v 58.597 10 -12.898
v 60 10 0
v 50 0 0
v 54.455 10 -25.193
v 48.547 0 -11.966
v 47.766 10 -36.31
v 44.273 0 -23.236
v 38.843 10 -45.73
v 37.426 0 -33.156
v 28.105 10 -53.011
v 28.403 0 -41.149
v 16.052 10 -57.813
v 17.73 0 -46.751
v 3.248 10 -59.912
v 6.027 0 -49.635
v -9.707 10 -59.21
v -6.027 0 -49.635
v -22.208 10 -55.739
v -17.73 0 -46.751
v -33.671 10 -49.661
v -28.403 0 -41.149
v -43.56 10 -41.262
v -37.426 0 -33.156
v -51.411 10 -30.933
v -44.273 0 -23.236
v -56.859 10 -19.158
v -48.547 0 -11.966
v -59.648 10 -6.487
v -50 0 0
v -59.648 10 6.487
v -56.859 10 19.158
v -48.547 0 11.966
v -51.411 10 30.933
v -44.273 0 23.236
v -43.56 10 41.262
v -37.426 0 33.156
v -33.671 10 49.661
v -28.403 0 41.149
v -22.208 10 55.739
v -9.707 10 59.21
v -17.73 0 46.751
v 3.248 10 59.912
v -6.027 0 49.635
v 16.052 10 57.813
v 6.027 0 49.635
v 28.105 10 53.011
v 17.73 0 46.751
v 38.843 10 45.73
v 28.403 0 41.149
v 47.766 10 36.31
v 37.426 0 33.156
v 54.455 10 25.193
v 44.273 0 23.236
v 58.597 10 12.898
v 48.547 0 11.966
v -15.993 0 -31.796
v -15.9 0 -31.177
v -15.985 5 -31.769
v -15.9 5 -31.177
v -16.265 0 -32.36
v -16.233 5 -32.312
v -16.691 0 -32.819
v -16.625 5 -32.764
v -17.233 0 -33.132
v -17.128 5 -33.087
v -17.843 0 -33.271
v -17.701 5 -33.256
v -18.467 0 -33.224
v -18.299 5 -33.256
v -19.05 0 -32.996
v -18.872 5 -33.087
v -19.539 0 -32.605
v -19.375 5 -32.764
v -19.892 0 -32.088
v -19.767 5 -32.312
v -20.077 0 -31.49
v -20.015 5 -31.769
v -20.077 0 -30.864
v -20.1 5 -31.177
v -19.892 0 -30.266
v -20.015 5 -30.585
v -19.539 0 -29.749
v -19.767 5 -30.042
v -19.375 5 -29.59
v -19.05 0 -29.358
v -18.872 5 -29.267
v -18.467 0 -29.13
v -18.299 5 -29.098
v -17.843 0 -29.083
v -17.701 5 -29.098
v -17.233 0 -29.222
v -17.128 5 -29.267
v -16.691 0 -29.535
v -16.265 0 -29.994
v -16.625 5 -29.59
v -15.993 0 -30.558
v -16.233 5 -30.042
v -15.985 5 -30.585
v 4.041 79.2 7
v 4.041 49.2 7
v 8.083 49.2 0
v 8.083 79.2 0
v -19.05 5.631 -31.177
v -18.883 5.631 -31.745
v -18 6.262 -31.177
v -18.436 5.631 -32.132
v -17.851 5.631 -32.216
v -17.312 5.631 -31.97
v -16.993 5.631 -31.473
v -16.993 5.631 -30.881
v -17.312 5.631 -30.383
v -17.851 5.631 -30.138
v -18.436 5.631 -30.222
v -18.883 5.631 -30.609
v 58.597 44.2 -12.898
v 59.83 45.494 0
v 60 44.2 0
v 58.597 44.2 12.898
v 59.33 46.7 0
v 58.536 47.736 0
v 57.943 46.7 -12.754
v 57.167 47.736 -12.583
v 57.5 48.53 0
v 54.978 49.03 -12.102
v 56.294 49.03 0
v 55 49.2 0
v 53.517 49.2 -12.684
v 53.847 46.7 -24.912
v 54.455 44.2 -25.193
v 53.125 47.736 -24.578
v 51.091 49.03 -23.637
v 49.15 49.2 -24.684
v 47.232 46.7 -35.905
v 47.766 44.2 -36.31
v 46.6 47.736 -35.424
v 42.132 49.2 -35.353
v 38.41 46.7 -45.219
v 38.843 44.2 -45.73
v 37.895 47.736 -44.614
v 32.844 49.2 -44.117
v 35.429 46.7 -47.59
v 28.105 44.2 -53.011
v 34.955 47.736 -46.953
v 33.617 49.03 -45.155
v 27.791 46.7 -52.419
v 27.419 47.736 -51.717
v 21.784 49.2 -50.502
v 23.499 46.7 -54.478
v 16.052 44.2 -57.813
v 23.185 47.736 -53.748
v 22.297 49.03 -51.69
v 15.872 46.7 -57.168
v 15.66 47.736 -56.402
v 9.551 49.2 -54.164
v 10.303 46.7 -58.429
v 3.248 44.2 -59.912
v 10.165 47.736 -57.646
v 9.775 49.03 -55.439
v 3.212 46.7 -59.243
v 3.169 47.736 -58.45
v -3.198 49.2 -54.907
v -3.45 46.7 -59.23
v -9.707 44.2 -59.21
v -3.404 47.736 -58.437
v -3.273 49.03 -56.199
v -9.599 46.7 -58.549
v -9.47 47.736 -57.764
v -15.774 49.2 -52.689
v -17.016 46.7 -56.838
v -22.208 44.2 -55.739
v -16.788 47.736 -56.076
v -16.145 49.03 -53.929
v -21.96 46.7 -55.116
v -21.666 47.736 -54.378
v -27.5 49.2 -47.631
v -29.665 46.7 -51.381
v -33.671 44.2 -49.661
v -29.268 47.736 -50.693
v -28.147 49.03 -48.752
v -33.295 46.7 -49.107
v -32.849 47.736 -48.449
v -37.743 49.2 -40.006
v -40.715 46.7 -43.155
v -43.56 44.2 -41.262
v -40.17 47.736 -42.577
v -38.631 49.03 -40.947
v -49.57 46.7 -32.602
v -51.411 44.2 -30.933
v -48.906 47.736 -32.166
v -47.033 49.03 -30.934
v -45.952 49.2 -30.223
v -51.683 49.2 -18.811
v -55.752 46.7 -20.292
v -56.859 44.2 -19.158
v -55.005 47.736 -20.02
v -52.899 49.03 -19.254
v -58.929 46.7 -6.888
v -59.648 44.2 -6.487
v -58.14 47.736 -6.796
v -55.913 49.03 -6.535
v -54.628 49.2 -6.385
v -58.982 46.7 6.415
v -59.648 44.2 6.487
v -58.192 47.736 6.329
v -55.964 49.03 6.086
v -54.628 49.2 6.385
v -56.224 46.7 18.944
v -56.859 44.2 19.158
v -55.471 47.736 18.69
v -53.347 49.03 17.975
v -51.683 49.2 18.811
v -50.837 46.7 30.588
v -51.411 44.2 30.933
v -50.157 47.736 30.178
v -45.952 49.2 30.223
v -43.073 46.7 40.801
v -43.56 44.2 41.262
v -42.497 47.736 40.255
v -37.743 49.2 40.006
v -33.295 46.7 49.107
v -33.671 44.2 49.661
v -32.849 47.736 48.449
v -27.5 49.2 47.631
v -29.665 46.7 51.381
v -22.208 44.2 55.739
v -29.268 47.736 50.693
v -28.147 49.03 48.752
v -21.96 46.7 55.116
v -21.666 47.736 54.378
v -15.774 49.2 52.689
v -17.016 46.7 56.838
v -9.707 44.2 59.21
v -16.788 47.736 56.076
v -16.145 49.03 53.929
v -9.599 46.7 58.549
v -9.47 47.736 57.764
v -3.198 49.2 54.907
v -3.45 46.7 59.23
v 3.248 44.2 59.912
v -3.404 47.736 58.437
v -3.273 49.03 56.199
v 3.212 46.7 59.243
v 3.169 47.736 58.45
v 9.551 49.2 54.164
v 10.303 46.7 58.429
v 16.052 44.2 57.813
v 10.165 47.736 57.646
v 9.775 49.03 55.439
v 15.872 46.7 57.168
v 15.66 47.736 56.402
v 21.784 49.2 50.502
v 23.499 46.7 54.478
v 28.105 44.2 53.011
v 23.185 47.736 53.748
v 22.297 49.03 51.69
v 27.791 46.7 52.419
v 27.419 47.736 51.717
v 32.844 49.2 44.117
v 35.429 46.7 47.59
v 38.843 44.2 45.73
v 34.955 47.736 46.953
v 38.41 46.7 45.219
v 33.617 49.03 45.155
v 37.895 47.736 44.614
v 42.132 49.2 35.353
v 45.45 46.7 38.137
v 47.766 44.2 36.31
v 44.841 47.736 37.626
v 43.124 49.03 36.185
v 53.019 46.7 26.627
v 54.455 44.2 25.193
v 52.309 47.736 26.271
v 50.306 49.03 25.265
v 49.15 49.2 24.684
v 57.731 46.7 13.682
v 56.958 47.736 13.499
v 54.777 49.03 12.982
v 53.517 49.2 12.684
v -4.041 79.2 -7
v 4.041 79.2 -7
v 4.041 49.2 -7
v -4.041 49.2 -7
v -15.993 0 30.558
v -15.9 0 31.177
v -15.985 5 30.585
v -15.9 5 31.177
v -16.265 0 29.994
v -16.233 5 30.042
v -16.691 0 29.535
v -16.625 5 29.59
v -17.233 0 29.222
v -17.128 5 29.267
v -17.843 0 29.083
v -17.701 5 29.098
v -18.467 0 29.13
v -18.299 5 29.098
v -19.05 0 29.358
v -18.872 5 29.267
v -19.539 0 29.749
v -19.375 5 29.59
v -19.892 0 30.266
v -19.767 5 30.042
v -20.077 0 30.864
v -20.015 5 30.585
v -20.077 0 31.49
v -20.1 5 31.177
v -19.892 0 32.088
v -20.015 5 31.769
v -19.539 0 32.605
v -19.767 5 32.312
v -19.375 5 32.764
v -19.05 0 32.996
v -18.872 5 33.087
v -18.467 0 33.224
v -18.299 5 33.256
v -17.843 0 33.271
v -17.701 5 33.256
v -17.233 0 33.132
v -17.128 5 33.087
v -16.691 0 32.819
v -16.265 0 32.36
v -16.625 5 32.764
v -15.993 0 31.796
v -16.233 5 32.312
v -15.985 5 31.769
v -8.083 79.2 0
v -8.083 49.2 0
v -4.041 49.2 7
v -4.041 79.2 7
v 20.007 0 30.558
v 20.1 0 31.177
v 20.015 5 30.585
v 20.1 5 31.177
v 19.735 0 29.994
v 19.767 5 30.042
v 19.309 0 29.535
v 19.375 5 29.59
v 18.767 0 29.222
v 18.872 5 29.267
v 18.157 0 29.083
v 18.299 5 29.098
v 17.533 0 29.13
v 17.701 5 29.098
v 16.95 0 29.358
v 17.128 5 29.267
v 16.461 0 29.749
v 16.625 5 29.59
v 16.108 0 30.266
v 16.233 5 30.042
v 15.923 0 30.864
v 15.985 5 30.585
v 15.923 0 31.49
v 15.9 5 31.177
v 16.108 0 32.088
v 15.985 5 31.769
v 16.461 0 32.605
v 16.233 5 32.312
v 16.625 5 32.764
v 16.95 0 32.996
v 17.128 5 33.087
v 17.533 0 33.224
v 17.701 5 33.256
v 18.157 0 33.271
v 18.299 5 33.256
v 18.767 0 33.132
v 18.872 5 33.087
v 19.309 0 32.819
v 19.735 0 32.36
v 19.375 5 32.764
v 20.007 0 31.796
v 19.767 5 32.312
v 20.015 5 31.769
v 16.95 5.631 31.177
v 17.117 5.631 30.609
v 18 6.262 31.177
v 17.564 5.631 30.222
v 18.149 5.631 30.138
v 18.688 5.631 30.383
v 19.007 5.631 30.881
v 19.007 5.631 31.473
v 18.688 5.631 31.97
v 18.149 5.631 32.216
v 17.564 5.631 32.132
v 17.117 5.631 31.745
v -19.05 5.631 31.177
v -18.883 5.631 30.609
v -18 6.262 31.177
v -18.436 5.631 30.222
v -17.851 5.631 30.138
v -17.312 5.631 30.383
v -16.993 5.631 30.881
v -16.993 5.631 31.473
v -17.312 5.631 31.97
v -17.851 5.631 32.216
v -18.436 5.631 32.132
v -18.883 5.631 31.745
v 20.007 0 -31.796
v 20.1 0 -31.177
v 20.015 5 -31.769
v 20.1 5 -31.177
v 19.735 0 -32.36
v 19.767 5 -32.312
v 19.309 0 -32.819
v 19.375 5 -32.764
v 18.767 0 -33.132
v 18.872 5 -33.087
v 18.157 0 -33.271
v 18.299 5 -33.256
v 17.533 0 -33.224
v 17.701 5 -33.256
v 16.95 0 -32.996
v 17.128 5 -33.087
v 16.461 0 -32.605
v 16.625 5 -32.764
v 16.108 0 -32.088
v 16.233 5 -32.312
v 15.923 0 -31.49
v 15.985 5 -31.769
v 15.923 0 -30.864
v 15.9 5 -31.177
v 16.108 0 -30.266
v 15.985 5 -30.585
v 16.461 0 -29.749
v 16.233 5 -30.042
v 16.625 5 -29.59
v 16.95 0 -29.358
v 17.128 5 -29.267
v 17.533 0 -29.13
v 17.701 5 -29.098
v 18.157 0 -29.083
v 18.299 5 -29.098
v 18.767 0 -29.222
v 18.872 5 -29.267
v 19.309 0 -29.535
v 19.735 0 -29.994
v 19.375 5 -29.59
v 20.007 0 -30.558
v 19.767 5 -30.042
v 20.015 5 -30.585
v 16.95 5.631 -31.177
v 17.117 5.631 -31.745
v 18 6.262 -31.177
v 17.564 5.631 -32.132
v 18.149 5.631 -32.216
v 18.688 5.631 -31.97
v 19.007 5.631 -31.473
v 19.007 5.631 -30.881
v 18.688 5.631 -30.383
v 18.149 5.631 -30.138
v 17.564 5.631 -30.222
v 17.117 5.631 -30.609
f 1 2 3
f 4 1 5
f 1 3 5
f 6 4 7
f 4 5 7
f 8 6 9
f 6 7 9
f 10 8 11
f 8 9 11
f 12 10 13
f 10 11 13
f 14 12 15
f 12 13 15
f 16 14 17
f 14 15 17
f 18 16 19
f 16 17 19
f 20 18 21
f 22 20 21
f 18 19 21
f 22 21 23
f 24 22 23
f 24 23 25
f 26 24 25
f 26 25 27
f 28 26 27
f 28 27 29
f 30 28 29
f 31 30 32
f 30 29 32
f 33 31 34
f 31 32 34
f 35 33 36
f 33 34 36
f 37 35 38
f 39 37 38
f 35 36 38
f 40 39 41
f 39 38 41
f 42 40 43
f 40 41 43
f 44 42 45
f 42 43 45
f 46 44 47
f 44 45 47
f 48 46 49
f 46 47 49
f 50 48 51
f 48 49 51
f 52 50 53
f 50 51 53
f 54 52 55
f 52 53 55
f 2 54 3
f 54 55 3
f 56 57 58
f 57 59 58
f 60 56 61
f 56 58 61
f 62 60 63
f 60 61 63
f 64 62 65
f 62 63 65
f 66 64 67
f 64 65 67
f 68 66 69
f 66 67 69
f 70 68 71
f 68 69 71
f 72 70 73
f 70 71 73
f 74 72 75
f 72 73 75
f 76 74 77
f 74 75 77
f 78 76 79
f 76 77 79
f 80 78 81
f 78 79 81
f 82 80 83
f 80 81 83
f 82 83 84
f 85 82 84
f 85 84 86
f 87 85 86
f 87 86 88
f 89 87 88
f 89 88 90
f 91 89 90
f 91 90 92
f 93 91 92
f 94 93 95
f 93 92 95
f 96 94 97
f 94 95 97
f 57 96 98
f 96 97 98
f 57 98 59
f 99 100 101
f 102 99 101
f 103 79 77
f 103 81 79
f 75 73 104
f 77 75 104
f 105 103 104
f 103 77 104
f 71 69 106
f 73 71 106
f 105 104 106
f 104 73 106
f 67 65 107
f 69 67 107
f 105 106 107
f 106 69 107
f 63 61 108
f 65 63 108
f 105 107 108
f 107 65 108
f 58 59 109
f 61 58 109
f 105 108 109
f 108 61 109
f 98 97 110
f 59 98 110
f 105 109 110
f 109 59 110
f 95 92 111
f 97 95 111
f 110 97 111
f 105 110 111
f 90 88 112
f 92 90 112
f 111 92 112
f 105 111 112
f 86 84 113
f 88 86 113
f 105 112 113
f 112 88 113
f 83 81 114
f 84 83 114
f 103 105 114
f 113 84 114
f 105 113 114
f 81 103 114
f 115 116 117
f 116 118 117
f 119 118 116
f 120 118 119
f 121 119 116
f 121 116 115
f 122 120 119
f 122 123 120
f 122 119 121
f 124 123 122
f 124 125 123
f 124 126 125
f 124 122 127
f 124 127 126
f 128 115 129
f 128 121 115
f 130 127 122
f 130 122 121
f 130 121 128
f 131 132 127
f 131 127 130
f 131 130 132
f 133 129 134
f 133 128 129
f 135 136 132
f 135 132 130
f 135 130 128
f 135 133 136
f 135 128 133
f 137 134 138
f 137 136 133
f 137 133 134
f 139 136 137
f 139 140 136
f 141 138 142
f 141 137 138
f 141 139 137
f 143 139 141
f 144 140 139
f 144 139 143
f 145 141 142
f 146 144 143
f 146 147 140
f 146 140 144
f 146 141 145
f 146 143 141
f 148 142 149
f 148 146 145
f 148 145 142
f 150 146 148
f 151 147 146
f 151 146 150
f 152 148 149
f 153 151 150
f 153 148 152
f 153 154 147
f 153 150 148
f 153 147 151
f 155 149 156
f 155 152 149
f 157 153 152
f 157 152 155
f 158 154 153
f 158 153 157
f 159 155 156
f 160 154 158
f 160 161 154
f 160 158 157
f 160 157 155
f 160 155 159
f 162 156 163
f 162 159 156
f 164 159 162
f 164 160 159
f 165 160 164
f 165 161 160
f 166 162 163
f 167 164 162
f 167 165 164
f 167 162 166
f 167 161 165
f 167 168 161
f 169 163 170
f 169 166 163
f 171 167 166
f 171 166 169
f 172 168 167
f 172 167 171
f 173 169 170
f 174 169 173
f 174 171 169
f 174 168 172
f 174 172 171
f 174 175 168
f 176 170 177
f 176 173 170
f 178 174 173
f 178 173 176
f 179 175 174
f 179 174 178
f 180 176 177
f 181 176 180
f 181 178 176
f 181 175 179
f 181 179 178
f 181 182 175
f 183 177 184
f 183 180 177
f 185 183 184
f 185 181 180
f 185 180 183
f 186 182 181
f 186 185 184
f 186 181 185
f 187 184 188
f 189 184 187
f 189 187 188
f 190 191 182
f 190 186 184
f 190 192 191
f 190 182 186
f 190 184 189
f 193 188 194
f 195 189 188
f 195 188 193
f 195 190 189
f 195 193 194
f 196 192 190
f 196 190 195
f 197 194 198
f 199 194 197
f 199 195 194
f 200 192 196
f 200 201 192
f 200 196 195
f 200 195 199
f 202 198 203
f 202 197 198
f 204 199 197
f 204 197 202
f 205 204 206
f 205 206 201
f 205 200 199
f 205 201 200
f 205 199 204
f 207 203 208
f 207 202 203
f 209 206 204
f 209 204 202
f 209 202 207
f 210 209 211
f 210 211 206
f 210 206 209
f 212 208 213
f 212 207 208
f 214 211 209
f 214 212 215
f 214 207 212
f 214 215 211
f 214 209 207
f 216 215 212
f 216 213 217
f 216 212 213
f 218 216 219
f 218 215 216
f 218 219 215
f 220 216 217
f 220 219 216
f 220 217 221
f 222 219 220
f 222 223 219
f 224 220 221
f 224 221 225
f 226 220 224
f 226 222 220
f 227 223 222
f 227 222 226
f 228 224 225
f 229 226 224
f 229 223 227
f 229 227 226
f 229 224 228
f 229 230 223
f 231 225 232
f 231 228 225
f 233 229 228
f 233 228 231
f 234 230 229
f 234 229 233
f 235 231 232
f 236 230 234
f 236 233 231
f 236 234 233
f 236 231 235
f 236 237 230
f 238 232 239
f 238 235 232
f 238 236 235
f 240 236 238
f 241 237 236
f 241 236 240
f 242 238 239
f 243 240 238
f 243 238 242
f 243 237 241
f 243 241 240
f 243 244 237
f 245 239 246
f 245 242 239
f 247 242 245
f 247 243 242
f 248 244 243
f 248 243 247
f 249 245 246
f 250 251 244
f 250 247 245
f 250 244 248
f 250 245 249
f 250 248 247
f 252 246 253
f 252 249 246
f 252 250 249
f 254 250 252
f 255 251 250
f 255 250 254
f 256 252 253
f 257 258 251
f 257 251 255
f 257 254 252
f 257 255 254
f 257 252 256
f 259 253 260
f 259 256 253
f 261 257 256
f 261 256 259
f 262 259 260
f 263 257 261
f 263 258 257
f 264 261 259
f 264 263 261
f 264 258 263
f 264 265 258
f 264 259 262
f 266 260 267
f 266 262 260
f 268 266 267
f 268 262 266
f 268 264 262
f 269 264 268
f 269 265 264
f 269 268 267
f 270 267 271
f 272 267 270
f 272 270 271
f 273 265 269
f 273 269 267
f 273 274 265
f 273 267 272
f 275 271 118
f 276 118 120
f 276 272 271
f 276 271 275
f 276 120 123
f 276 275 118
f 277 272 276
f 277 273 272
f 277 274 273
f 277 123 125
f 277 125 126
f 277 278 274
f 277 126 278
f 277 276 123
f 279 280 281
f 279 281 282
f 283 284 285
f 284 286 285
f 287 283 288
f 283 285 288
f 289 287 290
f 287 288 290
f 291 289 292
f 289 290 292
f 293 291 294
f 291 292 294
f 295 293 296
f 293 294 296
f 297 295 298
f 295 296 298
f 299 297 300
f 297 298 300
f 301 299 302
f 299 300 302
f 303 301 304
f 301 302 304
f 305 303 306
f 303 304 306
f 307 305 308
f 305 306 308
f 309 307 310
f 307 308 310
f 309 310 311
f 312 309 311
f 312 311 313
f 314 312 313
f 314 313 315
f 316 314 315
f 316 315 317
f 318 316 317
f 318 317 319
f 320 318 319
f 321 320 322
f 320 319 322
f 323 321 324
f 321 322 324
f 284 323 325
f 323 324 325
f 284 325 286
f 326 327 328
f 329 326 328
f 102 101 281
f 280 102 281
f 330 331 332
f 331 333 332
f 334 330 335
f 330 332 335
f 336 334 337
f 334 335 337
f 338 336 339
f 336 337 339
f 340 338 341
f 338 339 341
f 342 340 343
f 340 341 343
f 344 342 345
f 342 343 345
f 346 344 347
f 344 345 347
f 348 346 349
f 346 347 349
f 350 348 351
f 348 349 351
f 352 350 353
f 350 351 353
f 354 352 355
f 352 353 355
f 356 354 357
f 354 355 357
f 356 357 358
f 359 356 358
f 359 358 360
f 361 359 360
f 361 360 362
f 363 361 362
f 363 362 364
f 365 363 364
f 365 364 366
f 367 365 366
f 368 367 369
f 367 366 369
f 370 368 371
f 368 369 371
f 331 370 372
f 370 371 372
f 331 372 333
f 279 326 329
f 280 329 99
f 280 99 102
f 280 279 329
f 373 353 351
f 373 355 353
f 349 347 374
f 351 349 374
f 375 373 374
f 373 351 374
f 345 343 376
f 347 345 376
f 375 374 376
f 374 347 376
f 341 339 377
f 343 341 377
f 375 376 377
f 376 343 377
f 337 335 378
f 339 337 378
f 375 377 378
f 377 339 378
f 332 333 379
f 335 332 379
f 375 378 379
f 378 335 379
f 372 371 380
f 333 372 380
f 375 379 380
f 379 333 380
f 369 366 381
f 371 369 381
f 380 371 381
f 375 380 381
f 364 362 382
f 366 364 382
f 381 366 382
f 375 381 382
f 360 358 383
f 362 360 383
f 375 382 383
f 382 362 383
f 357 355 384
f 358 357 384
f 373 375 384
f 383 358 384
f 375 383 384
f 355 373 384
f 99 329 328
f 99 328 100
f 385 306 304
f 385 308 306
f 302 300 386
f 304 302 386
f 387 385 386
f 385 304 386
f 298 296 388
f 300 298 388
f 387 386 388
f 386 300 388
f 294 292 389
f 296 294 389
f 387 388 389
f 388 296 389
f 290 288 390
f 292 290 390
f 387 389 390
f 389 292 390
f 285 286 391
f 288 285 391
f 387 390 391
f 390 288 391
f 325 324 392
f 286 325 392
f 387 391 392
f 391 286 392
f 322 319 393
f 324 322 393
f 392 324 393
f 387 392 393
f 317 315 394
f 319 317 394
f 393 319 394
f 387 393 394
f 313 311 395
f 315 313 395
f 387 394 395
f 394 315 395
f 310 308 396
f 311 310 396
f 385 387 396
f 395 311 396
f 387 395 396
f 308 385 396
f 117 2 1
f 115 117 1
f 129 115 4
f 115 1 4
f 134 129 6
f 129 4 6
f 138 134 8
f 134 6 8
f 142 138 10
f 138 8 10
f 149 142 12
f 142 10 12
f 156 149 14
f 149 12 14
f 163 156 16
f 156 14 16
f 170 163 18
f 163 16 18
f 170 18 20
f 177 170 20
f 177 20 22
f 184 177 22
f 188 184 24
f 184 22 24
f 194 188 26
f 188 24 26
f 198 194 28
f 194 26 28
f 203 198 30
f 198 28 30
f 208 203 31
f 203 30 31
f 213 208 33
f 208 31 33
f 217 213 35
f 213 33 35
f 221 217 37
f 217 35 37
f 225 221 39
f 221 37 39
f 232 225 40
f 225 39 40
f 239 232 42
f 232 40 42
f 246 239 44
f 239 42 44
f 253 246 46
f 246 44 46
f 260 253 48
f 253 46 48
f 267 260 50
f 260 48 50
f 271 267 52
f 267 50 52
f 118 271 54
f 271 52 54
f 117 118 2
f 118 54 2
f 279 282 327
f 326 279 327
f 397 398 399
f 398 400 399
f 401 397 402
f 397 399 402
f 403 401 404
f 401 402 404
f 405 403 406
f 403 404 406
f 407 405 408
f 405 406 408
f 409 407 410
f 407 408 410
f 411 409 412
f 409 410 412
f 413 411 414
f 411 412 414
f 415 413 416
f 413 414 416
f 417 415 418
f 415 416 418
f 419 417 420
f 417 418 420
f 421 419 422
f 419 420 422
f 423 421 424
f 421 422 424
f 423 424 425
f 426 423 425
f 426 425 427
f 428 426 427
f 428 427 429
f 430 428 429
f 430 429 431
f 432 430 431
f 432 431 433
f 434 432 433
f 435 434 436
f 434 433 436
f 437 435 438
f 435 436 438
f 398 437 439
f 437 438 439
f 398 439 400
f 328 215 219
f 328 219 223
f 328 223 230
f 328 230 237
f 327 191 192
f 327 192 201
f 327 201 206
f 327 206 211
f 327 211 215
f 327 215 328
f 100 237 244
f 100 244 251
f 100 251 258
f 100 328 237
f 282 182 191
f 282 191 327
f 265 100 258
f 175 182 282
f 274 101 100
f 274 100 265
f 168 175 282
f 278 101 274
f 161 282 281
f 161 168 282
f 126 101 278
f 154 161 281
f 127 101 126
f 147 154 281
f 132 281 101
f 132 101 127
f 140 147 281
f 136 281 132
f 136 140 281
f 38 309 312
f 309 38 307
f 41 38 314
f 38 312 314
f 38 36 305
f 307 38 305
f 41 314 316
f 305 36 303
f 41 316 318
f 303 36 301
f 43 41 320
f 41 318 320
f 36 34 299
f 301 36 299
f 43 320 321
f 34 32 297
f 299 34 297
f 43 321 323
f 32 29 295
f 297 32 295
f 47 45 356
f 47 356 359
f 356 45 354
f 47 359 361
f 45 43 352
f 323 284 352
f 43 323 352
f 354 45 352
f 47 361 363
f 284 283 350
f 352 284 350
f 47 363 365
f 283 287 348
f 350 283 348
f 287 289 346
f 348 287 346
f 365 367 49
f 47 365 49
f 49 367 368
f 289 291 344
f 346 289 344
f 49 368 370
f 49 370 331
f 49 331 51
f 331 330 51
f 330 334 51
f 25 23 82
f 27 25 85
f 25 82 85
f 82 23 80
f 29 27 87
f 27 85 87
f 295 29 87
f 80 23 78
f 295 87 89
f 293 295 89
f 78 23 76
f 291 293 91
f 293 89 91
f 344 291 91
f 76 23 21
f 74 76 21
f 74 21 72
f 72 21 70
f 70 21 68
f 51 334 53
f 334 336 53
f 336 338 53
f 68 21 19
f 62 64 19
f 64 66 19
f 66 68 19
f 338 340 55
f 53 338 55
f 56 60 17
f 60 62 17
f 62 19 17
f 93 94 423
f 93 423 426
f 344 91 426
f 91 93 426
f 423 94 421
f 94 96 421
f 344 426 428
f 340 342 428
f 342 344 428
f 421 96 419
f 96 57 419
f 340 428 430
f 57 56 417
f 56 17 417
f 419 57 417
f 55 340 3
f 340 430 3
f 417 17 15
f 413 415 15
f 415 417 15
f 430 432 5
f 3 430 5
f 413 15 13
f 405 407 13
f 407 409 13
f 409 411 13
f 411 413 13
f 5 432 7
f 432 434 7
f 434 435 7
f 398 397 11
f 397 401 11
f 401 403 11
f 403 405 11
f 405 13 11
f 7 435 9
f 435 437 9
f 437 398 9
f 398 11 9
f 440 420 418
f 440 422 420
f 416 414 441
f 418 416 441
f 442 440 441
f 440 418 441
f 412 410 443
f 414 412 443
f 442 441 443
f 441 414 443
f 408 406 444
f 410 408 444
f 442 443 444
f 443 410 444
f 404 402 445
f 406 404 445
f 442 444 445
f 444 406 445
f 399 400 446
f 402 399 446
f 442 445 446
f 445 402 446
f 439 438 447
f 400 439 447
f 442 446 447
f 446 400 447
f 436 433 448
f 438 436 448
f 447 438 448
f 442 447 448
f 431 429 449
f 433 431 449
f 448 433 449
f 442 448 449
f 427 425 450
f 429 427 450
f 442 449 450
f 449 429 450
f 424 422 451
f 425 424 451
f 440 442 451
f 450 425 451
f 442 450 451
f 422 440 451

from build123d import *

# Parameters (mm, degrees)
SKETCH1_R                       = 60
BOSS_EXTRUDE1_DEPTH             = 49.2
BOSS_EXTRUDE3_DEPTH             = 30
FILLET1_R                       = 5
TAP_DRILL_FOR_M5X0_8_TAP1_D     = 4.2
TAP_DRILL_FOR_M5X0_8_TAP1_DEPTH = 5
TAP_DRILL_FOR_M5X0_8_TAP1_TIP   = 1.2618073
CHAMFER1_SIZE                   = 10


with BuildPart() as part:
    # Sketch1 → Boss-Extrude1 (new body)
    with BuildSketch(Plane(origin=(0, 0, 0), x_dir=(1, 0, 0), z_dir=(0, 1, 0))):
        Circle(SKETCH1_R)
    extrude(amount=BOSS_EXTRUDE1_DEPTH)

    # Sketch2 → Boss-Extrude3 (add)
    with BuildSketch(Plane(origin=(0, 49.2, 0), x_dir=(1, 0, 0), z_dir=(0, 1, 0))):
        Polygon((-4.041451884, 7), (-8.082903769, 0), (-4.041451884, -7), (4.041451884, -7), (8.082903769, 0), (4.041451884, 7), align=None)
    extrude(amount=BOSS_EXTRUDE3_DEPTH)

    # Fillet1
    fillet1_edges = [part.edges().sort_by_distance(p)[0] for p in [
        (-60, 49.2, 0),
    ]]
    fillet(fillet1_edges, radius=FILLET1_R)

    # Tap Drill for M5x0.8 Tap1
    with Locations(Plane(origin=(0, 0, 0), x_dir=(-1, 0, 0), z_dir=(0, -1, 0))):
        with Locations((-18, 31.176914536), (18, 31.176914536), (18, -31.176914536), (-18, -31.176914536)):
            Hole(TAP_DRILL_FOR_M5X0_8_TAP1_D / 2, depth=TAP_DRILL_FOR_M5X0_8_TAP1_DEPTH)
            with Locations((0, 0, -(TAP_DRILL_FOR_M5X0_8_TAP1_DEPTH + TAP_DRILL_FOR_M5X0_8_TAP1_TIP / 2))):  # 118° drill point
                Cone(0, TAP_DRILL_FOR_M5X0_8_TAP1_D / 2, TAP_DRILL_FOR_M5X0_8_TAP1_TIP, mode=Mode.SUBTRACT)

    # Chamfer1
    chamfer1_edges = [part.edges().sort_by_distance(p)[0] for p in [
        (-60, 0, 0),
    ]]
    chamfer(chamfer1_edges, length=CHAMFER1_SIZE)


solid = part.part
